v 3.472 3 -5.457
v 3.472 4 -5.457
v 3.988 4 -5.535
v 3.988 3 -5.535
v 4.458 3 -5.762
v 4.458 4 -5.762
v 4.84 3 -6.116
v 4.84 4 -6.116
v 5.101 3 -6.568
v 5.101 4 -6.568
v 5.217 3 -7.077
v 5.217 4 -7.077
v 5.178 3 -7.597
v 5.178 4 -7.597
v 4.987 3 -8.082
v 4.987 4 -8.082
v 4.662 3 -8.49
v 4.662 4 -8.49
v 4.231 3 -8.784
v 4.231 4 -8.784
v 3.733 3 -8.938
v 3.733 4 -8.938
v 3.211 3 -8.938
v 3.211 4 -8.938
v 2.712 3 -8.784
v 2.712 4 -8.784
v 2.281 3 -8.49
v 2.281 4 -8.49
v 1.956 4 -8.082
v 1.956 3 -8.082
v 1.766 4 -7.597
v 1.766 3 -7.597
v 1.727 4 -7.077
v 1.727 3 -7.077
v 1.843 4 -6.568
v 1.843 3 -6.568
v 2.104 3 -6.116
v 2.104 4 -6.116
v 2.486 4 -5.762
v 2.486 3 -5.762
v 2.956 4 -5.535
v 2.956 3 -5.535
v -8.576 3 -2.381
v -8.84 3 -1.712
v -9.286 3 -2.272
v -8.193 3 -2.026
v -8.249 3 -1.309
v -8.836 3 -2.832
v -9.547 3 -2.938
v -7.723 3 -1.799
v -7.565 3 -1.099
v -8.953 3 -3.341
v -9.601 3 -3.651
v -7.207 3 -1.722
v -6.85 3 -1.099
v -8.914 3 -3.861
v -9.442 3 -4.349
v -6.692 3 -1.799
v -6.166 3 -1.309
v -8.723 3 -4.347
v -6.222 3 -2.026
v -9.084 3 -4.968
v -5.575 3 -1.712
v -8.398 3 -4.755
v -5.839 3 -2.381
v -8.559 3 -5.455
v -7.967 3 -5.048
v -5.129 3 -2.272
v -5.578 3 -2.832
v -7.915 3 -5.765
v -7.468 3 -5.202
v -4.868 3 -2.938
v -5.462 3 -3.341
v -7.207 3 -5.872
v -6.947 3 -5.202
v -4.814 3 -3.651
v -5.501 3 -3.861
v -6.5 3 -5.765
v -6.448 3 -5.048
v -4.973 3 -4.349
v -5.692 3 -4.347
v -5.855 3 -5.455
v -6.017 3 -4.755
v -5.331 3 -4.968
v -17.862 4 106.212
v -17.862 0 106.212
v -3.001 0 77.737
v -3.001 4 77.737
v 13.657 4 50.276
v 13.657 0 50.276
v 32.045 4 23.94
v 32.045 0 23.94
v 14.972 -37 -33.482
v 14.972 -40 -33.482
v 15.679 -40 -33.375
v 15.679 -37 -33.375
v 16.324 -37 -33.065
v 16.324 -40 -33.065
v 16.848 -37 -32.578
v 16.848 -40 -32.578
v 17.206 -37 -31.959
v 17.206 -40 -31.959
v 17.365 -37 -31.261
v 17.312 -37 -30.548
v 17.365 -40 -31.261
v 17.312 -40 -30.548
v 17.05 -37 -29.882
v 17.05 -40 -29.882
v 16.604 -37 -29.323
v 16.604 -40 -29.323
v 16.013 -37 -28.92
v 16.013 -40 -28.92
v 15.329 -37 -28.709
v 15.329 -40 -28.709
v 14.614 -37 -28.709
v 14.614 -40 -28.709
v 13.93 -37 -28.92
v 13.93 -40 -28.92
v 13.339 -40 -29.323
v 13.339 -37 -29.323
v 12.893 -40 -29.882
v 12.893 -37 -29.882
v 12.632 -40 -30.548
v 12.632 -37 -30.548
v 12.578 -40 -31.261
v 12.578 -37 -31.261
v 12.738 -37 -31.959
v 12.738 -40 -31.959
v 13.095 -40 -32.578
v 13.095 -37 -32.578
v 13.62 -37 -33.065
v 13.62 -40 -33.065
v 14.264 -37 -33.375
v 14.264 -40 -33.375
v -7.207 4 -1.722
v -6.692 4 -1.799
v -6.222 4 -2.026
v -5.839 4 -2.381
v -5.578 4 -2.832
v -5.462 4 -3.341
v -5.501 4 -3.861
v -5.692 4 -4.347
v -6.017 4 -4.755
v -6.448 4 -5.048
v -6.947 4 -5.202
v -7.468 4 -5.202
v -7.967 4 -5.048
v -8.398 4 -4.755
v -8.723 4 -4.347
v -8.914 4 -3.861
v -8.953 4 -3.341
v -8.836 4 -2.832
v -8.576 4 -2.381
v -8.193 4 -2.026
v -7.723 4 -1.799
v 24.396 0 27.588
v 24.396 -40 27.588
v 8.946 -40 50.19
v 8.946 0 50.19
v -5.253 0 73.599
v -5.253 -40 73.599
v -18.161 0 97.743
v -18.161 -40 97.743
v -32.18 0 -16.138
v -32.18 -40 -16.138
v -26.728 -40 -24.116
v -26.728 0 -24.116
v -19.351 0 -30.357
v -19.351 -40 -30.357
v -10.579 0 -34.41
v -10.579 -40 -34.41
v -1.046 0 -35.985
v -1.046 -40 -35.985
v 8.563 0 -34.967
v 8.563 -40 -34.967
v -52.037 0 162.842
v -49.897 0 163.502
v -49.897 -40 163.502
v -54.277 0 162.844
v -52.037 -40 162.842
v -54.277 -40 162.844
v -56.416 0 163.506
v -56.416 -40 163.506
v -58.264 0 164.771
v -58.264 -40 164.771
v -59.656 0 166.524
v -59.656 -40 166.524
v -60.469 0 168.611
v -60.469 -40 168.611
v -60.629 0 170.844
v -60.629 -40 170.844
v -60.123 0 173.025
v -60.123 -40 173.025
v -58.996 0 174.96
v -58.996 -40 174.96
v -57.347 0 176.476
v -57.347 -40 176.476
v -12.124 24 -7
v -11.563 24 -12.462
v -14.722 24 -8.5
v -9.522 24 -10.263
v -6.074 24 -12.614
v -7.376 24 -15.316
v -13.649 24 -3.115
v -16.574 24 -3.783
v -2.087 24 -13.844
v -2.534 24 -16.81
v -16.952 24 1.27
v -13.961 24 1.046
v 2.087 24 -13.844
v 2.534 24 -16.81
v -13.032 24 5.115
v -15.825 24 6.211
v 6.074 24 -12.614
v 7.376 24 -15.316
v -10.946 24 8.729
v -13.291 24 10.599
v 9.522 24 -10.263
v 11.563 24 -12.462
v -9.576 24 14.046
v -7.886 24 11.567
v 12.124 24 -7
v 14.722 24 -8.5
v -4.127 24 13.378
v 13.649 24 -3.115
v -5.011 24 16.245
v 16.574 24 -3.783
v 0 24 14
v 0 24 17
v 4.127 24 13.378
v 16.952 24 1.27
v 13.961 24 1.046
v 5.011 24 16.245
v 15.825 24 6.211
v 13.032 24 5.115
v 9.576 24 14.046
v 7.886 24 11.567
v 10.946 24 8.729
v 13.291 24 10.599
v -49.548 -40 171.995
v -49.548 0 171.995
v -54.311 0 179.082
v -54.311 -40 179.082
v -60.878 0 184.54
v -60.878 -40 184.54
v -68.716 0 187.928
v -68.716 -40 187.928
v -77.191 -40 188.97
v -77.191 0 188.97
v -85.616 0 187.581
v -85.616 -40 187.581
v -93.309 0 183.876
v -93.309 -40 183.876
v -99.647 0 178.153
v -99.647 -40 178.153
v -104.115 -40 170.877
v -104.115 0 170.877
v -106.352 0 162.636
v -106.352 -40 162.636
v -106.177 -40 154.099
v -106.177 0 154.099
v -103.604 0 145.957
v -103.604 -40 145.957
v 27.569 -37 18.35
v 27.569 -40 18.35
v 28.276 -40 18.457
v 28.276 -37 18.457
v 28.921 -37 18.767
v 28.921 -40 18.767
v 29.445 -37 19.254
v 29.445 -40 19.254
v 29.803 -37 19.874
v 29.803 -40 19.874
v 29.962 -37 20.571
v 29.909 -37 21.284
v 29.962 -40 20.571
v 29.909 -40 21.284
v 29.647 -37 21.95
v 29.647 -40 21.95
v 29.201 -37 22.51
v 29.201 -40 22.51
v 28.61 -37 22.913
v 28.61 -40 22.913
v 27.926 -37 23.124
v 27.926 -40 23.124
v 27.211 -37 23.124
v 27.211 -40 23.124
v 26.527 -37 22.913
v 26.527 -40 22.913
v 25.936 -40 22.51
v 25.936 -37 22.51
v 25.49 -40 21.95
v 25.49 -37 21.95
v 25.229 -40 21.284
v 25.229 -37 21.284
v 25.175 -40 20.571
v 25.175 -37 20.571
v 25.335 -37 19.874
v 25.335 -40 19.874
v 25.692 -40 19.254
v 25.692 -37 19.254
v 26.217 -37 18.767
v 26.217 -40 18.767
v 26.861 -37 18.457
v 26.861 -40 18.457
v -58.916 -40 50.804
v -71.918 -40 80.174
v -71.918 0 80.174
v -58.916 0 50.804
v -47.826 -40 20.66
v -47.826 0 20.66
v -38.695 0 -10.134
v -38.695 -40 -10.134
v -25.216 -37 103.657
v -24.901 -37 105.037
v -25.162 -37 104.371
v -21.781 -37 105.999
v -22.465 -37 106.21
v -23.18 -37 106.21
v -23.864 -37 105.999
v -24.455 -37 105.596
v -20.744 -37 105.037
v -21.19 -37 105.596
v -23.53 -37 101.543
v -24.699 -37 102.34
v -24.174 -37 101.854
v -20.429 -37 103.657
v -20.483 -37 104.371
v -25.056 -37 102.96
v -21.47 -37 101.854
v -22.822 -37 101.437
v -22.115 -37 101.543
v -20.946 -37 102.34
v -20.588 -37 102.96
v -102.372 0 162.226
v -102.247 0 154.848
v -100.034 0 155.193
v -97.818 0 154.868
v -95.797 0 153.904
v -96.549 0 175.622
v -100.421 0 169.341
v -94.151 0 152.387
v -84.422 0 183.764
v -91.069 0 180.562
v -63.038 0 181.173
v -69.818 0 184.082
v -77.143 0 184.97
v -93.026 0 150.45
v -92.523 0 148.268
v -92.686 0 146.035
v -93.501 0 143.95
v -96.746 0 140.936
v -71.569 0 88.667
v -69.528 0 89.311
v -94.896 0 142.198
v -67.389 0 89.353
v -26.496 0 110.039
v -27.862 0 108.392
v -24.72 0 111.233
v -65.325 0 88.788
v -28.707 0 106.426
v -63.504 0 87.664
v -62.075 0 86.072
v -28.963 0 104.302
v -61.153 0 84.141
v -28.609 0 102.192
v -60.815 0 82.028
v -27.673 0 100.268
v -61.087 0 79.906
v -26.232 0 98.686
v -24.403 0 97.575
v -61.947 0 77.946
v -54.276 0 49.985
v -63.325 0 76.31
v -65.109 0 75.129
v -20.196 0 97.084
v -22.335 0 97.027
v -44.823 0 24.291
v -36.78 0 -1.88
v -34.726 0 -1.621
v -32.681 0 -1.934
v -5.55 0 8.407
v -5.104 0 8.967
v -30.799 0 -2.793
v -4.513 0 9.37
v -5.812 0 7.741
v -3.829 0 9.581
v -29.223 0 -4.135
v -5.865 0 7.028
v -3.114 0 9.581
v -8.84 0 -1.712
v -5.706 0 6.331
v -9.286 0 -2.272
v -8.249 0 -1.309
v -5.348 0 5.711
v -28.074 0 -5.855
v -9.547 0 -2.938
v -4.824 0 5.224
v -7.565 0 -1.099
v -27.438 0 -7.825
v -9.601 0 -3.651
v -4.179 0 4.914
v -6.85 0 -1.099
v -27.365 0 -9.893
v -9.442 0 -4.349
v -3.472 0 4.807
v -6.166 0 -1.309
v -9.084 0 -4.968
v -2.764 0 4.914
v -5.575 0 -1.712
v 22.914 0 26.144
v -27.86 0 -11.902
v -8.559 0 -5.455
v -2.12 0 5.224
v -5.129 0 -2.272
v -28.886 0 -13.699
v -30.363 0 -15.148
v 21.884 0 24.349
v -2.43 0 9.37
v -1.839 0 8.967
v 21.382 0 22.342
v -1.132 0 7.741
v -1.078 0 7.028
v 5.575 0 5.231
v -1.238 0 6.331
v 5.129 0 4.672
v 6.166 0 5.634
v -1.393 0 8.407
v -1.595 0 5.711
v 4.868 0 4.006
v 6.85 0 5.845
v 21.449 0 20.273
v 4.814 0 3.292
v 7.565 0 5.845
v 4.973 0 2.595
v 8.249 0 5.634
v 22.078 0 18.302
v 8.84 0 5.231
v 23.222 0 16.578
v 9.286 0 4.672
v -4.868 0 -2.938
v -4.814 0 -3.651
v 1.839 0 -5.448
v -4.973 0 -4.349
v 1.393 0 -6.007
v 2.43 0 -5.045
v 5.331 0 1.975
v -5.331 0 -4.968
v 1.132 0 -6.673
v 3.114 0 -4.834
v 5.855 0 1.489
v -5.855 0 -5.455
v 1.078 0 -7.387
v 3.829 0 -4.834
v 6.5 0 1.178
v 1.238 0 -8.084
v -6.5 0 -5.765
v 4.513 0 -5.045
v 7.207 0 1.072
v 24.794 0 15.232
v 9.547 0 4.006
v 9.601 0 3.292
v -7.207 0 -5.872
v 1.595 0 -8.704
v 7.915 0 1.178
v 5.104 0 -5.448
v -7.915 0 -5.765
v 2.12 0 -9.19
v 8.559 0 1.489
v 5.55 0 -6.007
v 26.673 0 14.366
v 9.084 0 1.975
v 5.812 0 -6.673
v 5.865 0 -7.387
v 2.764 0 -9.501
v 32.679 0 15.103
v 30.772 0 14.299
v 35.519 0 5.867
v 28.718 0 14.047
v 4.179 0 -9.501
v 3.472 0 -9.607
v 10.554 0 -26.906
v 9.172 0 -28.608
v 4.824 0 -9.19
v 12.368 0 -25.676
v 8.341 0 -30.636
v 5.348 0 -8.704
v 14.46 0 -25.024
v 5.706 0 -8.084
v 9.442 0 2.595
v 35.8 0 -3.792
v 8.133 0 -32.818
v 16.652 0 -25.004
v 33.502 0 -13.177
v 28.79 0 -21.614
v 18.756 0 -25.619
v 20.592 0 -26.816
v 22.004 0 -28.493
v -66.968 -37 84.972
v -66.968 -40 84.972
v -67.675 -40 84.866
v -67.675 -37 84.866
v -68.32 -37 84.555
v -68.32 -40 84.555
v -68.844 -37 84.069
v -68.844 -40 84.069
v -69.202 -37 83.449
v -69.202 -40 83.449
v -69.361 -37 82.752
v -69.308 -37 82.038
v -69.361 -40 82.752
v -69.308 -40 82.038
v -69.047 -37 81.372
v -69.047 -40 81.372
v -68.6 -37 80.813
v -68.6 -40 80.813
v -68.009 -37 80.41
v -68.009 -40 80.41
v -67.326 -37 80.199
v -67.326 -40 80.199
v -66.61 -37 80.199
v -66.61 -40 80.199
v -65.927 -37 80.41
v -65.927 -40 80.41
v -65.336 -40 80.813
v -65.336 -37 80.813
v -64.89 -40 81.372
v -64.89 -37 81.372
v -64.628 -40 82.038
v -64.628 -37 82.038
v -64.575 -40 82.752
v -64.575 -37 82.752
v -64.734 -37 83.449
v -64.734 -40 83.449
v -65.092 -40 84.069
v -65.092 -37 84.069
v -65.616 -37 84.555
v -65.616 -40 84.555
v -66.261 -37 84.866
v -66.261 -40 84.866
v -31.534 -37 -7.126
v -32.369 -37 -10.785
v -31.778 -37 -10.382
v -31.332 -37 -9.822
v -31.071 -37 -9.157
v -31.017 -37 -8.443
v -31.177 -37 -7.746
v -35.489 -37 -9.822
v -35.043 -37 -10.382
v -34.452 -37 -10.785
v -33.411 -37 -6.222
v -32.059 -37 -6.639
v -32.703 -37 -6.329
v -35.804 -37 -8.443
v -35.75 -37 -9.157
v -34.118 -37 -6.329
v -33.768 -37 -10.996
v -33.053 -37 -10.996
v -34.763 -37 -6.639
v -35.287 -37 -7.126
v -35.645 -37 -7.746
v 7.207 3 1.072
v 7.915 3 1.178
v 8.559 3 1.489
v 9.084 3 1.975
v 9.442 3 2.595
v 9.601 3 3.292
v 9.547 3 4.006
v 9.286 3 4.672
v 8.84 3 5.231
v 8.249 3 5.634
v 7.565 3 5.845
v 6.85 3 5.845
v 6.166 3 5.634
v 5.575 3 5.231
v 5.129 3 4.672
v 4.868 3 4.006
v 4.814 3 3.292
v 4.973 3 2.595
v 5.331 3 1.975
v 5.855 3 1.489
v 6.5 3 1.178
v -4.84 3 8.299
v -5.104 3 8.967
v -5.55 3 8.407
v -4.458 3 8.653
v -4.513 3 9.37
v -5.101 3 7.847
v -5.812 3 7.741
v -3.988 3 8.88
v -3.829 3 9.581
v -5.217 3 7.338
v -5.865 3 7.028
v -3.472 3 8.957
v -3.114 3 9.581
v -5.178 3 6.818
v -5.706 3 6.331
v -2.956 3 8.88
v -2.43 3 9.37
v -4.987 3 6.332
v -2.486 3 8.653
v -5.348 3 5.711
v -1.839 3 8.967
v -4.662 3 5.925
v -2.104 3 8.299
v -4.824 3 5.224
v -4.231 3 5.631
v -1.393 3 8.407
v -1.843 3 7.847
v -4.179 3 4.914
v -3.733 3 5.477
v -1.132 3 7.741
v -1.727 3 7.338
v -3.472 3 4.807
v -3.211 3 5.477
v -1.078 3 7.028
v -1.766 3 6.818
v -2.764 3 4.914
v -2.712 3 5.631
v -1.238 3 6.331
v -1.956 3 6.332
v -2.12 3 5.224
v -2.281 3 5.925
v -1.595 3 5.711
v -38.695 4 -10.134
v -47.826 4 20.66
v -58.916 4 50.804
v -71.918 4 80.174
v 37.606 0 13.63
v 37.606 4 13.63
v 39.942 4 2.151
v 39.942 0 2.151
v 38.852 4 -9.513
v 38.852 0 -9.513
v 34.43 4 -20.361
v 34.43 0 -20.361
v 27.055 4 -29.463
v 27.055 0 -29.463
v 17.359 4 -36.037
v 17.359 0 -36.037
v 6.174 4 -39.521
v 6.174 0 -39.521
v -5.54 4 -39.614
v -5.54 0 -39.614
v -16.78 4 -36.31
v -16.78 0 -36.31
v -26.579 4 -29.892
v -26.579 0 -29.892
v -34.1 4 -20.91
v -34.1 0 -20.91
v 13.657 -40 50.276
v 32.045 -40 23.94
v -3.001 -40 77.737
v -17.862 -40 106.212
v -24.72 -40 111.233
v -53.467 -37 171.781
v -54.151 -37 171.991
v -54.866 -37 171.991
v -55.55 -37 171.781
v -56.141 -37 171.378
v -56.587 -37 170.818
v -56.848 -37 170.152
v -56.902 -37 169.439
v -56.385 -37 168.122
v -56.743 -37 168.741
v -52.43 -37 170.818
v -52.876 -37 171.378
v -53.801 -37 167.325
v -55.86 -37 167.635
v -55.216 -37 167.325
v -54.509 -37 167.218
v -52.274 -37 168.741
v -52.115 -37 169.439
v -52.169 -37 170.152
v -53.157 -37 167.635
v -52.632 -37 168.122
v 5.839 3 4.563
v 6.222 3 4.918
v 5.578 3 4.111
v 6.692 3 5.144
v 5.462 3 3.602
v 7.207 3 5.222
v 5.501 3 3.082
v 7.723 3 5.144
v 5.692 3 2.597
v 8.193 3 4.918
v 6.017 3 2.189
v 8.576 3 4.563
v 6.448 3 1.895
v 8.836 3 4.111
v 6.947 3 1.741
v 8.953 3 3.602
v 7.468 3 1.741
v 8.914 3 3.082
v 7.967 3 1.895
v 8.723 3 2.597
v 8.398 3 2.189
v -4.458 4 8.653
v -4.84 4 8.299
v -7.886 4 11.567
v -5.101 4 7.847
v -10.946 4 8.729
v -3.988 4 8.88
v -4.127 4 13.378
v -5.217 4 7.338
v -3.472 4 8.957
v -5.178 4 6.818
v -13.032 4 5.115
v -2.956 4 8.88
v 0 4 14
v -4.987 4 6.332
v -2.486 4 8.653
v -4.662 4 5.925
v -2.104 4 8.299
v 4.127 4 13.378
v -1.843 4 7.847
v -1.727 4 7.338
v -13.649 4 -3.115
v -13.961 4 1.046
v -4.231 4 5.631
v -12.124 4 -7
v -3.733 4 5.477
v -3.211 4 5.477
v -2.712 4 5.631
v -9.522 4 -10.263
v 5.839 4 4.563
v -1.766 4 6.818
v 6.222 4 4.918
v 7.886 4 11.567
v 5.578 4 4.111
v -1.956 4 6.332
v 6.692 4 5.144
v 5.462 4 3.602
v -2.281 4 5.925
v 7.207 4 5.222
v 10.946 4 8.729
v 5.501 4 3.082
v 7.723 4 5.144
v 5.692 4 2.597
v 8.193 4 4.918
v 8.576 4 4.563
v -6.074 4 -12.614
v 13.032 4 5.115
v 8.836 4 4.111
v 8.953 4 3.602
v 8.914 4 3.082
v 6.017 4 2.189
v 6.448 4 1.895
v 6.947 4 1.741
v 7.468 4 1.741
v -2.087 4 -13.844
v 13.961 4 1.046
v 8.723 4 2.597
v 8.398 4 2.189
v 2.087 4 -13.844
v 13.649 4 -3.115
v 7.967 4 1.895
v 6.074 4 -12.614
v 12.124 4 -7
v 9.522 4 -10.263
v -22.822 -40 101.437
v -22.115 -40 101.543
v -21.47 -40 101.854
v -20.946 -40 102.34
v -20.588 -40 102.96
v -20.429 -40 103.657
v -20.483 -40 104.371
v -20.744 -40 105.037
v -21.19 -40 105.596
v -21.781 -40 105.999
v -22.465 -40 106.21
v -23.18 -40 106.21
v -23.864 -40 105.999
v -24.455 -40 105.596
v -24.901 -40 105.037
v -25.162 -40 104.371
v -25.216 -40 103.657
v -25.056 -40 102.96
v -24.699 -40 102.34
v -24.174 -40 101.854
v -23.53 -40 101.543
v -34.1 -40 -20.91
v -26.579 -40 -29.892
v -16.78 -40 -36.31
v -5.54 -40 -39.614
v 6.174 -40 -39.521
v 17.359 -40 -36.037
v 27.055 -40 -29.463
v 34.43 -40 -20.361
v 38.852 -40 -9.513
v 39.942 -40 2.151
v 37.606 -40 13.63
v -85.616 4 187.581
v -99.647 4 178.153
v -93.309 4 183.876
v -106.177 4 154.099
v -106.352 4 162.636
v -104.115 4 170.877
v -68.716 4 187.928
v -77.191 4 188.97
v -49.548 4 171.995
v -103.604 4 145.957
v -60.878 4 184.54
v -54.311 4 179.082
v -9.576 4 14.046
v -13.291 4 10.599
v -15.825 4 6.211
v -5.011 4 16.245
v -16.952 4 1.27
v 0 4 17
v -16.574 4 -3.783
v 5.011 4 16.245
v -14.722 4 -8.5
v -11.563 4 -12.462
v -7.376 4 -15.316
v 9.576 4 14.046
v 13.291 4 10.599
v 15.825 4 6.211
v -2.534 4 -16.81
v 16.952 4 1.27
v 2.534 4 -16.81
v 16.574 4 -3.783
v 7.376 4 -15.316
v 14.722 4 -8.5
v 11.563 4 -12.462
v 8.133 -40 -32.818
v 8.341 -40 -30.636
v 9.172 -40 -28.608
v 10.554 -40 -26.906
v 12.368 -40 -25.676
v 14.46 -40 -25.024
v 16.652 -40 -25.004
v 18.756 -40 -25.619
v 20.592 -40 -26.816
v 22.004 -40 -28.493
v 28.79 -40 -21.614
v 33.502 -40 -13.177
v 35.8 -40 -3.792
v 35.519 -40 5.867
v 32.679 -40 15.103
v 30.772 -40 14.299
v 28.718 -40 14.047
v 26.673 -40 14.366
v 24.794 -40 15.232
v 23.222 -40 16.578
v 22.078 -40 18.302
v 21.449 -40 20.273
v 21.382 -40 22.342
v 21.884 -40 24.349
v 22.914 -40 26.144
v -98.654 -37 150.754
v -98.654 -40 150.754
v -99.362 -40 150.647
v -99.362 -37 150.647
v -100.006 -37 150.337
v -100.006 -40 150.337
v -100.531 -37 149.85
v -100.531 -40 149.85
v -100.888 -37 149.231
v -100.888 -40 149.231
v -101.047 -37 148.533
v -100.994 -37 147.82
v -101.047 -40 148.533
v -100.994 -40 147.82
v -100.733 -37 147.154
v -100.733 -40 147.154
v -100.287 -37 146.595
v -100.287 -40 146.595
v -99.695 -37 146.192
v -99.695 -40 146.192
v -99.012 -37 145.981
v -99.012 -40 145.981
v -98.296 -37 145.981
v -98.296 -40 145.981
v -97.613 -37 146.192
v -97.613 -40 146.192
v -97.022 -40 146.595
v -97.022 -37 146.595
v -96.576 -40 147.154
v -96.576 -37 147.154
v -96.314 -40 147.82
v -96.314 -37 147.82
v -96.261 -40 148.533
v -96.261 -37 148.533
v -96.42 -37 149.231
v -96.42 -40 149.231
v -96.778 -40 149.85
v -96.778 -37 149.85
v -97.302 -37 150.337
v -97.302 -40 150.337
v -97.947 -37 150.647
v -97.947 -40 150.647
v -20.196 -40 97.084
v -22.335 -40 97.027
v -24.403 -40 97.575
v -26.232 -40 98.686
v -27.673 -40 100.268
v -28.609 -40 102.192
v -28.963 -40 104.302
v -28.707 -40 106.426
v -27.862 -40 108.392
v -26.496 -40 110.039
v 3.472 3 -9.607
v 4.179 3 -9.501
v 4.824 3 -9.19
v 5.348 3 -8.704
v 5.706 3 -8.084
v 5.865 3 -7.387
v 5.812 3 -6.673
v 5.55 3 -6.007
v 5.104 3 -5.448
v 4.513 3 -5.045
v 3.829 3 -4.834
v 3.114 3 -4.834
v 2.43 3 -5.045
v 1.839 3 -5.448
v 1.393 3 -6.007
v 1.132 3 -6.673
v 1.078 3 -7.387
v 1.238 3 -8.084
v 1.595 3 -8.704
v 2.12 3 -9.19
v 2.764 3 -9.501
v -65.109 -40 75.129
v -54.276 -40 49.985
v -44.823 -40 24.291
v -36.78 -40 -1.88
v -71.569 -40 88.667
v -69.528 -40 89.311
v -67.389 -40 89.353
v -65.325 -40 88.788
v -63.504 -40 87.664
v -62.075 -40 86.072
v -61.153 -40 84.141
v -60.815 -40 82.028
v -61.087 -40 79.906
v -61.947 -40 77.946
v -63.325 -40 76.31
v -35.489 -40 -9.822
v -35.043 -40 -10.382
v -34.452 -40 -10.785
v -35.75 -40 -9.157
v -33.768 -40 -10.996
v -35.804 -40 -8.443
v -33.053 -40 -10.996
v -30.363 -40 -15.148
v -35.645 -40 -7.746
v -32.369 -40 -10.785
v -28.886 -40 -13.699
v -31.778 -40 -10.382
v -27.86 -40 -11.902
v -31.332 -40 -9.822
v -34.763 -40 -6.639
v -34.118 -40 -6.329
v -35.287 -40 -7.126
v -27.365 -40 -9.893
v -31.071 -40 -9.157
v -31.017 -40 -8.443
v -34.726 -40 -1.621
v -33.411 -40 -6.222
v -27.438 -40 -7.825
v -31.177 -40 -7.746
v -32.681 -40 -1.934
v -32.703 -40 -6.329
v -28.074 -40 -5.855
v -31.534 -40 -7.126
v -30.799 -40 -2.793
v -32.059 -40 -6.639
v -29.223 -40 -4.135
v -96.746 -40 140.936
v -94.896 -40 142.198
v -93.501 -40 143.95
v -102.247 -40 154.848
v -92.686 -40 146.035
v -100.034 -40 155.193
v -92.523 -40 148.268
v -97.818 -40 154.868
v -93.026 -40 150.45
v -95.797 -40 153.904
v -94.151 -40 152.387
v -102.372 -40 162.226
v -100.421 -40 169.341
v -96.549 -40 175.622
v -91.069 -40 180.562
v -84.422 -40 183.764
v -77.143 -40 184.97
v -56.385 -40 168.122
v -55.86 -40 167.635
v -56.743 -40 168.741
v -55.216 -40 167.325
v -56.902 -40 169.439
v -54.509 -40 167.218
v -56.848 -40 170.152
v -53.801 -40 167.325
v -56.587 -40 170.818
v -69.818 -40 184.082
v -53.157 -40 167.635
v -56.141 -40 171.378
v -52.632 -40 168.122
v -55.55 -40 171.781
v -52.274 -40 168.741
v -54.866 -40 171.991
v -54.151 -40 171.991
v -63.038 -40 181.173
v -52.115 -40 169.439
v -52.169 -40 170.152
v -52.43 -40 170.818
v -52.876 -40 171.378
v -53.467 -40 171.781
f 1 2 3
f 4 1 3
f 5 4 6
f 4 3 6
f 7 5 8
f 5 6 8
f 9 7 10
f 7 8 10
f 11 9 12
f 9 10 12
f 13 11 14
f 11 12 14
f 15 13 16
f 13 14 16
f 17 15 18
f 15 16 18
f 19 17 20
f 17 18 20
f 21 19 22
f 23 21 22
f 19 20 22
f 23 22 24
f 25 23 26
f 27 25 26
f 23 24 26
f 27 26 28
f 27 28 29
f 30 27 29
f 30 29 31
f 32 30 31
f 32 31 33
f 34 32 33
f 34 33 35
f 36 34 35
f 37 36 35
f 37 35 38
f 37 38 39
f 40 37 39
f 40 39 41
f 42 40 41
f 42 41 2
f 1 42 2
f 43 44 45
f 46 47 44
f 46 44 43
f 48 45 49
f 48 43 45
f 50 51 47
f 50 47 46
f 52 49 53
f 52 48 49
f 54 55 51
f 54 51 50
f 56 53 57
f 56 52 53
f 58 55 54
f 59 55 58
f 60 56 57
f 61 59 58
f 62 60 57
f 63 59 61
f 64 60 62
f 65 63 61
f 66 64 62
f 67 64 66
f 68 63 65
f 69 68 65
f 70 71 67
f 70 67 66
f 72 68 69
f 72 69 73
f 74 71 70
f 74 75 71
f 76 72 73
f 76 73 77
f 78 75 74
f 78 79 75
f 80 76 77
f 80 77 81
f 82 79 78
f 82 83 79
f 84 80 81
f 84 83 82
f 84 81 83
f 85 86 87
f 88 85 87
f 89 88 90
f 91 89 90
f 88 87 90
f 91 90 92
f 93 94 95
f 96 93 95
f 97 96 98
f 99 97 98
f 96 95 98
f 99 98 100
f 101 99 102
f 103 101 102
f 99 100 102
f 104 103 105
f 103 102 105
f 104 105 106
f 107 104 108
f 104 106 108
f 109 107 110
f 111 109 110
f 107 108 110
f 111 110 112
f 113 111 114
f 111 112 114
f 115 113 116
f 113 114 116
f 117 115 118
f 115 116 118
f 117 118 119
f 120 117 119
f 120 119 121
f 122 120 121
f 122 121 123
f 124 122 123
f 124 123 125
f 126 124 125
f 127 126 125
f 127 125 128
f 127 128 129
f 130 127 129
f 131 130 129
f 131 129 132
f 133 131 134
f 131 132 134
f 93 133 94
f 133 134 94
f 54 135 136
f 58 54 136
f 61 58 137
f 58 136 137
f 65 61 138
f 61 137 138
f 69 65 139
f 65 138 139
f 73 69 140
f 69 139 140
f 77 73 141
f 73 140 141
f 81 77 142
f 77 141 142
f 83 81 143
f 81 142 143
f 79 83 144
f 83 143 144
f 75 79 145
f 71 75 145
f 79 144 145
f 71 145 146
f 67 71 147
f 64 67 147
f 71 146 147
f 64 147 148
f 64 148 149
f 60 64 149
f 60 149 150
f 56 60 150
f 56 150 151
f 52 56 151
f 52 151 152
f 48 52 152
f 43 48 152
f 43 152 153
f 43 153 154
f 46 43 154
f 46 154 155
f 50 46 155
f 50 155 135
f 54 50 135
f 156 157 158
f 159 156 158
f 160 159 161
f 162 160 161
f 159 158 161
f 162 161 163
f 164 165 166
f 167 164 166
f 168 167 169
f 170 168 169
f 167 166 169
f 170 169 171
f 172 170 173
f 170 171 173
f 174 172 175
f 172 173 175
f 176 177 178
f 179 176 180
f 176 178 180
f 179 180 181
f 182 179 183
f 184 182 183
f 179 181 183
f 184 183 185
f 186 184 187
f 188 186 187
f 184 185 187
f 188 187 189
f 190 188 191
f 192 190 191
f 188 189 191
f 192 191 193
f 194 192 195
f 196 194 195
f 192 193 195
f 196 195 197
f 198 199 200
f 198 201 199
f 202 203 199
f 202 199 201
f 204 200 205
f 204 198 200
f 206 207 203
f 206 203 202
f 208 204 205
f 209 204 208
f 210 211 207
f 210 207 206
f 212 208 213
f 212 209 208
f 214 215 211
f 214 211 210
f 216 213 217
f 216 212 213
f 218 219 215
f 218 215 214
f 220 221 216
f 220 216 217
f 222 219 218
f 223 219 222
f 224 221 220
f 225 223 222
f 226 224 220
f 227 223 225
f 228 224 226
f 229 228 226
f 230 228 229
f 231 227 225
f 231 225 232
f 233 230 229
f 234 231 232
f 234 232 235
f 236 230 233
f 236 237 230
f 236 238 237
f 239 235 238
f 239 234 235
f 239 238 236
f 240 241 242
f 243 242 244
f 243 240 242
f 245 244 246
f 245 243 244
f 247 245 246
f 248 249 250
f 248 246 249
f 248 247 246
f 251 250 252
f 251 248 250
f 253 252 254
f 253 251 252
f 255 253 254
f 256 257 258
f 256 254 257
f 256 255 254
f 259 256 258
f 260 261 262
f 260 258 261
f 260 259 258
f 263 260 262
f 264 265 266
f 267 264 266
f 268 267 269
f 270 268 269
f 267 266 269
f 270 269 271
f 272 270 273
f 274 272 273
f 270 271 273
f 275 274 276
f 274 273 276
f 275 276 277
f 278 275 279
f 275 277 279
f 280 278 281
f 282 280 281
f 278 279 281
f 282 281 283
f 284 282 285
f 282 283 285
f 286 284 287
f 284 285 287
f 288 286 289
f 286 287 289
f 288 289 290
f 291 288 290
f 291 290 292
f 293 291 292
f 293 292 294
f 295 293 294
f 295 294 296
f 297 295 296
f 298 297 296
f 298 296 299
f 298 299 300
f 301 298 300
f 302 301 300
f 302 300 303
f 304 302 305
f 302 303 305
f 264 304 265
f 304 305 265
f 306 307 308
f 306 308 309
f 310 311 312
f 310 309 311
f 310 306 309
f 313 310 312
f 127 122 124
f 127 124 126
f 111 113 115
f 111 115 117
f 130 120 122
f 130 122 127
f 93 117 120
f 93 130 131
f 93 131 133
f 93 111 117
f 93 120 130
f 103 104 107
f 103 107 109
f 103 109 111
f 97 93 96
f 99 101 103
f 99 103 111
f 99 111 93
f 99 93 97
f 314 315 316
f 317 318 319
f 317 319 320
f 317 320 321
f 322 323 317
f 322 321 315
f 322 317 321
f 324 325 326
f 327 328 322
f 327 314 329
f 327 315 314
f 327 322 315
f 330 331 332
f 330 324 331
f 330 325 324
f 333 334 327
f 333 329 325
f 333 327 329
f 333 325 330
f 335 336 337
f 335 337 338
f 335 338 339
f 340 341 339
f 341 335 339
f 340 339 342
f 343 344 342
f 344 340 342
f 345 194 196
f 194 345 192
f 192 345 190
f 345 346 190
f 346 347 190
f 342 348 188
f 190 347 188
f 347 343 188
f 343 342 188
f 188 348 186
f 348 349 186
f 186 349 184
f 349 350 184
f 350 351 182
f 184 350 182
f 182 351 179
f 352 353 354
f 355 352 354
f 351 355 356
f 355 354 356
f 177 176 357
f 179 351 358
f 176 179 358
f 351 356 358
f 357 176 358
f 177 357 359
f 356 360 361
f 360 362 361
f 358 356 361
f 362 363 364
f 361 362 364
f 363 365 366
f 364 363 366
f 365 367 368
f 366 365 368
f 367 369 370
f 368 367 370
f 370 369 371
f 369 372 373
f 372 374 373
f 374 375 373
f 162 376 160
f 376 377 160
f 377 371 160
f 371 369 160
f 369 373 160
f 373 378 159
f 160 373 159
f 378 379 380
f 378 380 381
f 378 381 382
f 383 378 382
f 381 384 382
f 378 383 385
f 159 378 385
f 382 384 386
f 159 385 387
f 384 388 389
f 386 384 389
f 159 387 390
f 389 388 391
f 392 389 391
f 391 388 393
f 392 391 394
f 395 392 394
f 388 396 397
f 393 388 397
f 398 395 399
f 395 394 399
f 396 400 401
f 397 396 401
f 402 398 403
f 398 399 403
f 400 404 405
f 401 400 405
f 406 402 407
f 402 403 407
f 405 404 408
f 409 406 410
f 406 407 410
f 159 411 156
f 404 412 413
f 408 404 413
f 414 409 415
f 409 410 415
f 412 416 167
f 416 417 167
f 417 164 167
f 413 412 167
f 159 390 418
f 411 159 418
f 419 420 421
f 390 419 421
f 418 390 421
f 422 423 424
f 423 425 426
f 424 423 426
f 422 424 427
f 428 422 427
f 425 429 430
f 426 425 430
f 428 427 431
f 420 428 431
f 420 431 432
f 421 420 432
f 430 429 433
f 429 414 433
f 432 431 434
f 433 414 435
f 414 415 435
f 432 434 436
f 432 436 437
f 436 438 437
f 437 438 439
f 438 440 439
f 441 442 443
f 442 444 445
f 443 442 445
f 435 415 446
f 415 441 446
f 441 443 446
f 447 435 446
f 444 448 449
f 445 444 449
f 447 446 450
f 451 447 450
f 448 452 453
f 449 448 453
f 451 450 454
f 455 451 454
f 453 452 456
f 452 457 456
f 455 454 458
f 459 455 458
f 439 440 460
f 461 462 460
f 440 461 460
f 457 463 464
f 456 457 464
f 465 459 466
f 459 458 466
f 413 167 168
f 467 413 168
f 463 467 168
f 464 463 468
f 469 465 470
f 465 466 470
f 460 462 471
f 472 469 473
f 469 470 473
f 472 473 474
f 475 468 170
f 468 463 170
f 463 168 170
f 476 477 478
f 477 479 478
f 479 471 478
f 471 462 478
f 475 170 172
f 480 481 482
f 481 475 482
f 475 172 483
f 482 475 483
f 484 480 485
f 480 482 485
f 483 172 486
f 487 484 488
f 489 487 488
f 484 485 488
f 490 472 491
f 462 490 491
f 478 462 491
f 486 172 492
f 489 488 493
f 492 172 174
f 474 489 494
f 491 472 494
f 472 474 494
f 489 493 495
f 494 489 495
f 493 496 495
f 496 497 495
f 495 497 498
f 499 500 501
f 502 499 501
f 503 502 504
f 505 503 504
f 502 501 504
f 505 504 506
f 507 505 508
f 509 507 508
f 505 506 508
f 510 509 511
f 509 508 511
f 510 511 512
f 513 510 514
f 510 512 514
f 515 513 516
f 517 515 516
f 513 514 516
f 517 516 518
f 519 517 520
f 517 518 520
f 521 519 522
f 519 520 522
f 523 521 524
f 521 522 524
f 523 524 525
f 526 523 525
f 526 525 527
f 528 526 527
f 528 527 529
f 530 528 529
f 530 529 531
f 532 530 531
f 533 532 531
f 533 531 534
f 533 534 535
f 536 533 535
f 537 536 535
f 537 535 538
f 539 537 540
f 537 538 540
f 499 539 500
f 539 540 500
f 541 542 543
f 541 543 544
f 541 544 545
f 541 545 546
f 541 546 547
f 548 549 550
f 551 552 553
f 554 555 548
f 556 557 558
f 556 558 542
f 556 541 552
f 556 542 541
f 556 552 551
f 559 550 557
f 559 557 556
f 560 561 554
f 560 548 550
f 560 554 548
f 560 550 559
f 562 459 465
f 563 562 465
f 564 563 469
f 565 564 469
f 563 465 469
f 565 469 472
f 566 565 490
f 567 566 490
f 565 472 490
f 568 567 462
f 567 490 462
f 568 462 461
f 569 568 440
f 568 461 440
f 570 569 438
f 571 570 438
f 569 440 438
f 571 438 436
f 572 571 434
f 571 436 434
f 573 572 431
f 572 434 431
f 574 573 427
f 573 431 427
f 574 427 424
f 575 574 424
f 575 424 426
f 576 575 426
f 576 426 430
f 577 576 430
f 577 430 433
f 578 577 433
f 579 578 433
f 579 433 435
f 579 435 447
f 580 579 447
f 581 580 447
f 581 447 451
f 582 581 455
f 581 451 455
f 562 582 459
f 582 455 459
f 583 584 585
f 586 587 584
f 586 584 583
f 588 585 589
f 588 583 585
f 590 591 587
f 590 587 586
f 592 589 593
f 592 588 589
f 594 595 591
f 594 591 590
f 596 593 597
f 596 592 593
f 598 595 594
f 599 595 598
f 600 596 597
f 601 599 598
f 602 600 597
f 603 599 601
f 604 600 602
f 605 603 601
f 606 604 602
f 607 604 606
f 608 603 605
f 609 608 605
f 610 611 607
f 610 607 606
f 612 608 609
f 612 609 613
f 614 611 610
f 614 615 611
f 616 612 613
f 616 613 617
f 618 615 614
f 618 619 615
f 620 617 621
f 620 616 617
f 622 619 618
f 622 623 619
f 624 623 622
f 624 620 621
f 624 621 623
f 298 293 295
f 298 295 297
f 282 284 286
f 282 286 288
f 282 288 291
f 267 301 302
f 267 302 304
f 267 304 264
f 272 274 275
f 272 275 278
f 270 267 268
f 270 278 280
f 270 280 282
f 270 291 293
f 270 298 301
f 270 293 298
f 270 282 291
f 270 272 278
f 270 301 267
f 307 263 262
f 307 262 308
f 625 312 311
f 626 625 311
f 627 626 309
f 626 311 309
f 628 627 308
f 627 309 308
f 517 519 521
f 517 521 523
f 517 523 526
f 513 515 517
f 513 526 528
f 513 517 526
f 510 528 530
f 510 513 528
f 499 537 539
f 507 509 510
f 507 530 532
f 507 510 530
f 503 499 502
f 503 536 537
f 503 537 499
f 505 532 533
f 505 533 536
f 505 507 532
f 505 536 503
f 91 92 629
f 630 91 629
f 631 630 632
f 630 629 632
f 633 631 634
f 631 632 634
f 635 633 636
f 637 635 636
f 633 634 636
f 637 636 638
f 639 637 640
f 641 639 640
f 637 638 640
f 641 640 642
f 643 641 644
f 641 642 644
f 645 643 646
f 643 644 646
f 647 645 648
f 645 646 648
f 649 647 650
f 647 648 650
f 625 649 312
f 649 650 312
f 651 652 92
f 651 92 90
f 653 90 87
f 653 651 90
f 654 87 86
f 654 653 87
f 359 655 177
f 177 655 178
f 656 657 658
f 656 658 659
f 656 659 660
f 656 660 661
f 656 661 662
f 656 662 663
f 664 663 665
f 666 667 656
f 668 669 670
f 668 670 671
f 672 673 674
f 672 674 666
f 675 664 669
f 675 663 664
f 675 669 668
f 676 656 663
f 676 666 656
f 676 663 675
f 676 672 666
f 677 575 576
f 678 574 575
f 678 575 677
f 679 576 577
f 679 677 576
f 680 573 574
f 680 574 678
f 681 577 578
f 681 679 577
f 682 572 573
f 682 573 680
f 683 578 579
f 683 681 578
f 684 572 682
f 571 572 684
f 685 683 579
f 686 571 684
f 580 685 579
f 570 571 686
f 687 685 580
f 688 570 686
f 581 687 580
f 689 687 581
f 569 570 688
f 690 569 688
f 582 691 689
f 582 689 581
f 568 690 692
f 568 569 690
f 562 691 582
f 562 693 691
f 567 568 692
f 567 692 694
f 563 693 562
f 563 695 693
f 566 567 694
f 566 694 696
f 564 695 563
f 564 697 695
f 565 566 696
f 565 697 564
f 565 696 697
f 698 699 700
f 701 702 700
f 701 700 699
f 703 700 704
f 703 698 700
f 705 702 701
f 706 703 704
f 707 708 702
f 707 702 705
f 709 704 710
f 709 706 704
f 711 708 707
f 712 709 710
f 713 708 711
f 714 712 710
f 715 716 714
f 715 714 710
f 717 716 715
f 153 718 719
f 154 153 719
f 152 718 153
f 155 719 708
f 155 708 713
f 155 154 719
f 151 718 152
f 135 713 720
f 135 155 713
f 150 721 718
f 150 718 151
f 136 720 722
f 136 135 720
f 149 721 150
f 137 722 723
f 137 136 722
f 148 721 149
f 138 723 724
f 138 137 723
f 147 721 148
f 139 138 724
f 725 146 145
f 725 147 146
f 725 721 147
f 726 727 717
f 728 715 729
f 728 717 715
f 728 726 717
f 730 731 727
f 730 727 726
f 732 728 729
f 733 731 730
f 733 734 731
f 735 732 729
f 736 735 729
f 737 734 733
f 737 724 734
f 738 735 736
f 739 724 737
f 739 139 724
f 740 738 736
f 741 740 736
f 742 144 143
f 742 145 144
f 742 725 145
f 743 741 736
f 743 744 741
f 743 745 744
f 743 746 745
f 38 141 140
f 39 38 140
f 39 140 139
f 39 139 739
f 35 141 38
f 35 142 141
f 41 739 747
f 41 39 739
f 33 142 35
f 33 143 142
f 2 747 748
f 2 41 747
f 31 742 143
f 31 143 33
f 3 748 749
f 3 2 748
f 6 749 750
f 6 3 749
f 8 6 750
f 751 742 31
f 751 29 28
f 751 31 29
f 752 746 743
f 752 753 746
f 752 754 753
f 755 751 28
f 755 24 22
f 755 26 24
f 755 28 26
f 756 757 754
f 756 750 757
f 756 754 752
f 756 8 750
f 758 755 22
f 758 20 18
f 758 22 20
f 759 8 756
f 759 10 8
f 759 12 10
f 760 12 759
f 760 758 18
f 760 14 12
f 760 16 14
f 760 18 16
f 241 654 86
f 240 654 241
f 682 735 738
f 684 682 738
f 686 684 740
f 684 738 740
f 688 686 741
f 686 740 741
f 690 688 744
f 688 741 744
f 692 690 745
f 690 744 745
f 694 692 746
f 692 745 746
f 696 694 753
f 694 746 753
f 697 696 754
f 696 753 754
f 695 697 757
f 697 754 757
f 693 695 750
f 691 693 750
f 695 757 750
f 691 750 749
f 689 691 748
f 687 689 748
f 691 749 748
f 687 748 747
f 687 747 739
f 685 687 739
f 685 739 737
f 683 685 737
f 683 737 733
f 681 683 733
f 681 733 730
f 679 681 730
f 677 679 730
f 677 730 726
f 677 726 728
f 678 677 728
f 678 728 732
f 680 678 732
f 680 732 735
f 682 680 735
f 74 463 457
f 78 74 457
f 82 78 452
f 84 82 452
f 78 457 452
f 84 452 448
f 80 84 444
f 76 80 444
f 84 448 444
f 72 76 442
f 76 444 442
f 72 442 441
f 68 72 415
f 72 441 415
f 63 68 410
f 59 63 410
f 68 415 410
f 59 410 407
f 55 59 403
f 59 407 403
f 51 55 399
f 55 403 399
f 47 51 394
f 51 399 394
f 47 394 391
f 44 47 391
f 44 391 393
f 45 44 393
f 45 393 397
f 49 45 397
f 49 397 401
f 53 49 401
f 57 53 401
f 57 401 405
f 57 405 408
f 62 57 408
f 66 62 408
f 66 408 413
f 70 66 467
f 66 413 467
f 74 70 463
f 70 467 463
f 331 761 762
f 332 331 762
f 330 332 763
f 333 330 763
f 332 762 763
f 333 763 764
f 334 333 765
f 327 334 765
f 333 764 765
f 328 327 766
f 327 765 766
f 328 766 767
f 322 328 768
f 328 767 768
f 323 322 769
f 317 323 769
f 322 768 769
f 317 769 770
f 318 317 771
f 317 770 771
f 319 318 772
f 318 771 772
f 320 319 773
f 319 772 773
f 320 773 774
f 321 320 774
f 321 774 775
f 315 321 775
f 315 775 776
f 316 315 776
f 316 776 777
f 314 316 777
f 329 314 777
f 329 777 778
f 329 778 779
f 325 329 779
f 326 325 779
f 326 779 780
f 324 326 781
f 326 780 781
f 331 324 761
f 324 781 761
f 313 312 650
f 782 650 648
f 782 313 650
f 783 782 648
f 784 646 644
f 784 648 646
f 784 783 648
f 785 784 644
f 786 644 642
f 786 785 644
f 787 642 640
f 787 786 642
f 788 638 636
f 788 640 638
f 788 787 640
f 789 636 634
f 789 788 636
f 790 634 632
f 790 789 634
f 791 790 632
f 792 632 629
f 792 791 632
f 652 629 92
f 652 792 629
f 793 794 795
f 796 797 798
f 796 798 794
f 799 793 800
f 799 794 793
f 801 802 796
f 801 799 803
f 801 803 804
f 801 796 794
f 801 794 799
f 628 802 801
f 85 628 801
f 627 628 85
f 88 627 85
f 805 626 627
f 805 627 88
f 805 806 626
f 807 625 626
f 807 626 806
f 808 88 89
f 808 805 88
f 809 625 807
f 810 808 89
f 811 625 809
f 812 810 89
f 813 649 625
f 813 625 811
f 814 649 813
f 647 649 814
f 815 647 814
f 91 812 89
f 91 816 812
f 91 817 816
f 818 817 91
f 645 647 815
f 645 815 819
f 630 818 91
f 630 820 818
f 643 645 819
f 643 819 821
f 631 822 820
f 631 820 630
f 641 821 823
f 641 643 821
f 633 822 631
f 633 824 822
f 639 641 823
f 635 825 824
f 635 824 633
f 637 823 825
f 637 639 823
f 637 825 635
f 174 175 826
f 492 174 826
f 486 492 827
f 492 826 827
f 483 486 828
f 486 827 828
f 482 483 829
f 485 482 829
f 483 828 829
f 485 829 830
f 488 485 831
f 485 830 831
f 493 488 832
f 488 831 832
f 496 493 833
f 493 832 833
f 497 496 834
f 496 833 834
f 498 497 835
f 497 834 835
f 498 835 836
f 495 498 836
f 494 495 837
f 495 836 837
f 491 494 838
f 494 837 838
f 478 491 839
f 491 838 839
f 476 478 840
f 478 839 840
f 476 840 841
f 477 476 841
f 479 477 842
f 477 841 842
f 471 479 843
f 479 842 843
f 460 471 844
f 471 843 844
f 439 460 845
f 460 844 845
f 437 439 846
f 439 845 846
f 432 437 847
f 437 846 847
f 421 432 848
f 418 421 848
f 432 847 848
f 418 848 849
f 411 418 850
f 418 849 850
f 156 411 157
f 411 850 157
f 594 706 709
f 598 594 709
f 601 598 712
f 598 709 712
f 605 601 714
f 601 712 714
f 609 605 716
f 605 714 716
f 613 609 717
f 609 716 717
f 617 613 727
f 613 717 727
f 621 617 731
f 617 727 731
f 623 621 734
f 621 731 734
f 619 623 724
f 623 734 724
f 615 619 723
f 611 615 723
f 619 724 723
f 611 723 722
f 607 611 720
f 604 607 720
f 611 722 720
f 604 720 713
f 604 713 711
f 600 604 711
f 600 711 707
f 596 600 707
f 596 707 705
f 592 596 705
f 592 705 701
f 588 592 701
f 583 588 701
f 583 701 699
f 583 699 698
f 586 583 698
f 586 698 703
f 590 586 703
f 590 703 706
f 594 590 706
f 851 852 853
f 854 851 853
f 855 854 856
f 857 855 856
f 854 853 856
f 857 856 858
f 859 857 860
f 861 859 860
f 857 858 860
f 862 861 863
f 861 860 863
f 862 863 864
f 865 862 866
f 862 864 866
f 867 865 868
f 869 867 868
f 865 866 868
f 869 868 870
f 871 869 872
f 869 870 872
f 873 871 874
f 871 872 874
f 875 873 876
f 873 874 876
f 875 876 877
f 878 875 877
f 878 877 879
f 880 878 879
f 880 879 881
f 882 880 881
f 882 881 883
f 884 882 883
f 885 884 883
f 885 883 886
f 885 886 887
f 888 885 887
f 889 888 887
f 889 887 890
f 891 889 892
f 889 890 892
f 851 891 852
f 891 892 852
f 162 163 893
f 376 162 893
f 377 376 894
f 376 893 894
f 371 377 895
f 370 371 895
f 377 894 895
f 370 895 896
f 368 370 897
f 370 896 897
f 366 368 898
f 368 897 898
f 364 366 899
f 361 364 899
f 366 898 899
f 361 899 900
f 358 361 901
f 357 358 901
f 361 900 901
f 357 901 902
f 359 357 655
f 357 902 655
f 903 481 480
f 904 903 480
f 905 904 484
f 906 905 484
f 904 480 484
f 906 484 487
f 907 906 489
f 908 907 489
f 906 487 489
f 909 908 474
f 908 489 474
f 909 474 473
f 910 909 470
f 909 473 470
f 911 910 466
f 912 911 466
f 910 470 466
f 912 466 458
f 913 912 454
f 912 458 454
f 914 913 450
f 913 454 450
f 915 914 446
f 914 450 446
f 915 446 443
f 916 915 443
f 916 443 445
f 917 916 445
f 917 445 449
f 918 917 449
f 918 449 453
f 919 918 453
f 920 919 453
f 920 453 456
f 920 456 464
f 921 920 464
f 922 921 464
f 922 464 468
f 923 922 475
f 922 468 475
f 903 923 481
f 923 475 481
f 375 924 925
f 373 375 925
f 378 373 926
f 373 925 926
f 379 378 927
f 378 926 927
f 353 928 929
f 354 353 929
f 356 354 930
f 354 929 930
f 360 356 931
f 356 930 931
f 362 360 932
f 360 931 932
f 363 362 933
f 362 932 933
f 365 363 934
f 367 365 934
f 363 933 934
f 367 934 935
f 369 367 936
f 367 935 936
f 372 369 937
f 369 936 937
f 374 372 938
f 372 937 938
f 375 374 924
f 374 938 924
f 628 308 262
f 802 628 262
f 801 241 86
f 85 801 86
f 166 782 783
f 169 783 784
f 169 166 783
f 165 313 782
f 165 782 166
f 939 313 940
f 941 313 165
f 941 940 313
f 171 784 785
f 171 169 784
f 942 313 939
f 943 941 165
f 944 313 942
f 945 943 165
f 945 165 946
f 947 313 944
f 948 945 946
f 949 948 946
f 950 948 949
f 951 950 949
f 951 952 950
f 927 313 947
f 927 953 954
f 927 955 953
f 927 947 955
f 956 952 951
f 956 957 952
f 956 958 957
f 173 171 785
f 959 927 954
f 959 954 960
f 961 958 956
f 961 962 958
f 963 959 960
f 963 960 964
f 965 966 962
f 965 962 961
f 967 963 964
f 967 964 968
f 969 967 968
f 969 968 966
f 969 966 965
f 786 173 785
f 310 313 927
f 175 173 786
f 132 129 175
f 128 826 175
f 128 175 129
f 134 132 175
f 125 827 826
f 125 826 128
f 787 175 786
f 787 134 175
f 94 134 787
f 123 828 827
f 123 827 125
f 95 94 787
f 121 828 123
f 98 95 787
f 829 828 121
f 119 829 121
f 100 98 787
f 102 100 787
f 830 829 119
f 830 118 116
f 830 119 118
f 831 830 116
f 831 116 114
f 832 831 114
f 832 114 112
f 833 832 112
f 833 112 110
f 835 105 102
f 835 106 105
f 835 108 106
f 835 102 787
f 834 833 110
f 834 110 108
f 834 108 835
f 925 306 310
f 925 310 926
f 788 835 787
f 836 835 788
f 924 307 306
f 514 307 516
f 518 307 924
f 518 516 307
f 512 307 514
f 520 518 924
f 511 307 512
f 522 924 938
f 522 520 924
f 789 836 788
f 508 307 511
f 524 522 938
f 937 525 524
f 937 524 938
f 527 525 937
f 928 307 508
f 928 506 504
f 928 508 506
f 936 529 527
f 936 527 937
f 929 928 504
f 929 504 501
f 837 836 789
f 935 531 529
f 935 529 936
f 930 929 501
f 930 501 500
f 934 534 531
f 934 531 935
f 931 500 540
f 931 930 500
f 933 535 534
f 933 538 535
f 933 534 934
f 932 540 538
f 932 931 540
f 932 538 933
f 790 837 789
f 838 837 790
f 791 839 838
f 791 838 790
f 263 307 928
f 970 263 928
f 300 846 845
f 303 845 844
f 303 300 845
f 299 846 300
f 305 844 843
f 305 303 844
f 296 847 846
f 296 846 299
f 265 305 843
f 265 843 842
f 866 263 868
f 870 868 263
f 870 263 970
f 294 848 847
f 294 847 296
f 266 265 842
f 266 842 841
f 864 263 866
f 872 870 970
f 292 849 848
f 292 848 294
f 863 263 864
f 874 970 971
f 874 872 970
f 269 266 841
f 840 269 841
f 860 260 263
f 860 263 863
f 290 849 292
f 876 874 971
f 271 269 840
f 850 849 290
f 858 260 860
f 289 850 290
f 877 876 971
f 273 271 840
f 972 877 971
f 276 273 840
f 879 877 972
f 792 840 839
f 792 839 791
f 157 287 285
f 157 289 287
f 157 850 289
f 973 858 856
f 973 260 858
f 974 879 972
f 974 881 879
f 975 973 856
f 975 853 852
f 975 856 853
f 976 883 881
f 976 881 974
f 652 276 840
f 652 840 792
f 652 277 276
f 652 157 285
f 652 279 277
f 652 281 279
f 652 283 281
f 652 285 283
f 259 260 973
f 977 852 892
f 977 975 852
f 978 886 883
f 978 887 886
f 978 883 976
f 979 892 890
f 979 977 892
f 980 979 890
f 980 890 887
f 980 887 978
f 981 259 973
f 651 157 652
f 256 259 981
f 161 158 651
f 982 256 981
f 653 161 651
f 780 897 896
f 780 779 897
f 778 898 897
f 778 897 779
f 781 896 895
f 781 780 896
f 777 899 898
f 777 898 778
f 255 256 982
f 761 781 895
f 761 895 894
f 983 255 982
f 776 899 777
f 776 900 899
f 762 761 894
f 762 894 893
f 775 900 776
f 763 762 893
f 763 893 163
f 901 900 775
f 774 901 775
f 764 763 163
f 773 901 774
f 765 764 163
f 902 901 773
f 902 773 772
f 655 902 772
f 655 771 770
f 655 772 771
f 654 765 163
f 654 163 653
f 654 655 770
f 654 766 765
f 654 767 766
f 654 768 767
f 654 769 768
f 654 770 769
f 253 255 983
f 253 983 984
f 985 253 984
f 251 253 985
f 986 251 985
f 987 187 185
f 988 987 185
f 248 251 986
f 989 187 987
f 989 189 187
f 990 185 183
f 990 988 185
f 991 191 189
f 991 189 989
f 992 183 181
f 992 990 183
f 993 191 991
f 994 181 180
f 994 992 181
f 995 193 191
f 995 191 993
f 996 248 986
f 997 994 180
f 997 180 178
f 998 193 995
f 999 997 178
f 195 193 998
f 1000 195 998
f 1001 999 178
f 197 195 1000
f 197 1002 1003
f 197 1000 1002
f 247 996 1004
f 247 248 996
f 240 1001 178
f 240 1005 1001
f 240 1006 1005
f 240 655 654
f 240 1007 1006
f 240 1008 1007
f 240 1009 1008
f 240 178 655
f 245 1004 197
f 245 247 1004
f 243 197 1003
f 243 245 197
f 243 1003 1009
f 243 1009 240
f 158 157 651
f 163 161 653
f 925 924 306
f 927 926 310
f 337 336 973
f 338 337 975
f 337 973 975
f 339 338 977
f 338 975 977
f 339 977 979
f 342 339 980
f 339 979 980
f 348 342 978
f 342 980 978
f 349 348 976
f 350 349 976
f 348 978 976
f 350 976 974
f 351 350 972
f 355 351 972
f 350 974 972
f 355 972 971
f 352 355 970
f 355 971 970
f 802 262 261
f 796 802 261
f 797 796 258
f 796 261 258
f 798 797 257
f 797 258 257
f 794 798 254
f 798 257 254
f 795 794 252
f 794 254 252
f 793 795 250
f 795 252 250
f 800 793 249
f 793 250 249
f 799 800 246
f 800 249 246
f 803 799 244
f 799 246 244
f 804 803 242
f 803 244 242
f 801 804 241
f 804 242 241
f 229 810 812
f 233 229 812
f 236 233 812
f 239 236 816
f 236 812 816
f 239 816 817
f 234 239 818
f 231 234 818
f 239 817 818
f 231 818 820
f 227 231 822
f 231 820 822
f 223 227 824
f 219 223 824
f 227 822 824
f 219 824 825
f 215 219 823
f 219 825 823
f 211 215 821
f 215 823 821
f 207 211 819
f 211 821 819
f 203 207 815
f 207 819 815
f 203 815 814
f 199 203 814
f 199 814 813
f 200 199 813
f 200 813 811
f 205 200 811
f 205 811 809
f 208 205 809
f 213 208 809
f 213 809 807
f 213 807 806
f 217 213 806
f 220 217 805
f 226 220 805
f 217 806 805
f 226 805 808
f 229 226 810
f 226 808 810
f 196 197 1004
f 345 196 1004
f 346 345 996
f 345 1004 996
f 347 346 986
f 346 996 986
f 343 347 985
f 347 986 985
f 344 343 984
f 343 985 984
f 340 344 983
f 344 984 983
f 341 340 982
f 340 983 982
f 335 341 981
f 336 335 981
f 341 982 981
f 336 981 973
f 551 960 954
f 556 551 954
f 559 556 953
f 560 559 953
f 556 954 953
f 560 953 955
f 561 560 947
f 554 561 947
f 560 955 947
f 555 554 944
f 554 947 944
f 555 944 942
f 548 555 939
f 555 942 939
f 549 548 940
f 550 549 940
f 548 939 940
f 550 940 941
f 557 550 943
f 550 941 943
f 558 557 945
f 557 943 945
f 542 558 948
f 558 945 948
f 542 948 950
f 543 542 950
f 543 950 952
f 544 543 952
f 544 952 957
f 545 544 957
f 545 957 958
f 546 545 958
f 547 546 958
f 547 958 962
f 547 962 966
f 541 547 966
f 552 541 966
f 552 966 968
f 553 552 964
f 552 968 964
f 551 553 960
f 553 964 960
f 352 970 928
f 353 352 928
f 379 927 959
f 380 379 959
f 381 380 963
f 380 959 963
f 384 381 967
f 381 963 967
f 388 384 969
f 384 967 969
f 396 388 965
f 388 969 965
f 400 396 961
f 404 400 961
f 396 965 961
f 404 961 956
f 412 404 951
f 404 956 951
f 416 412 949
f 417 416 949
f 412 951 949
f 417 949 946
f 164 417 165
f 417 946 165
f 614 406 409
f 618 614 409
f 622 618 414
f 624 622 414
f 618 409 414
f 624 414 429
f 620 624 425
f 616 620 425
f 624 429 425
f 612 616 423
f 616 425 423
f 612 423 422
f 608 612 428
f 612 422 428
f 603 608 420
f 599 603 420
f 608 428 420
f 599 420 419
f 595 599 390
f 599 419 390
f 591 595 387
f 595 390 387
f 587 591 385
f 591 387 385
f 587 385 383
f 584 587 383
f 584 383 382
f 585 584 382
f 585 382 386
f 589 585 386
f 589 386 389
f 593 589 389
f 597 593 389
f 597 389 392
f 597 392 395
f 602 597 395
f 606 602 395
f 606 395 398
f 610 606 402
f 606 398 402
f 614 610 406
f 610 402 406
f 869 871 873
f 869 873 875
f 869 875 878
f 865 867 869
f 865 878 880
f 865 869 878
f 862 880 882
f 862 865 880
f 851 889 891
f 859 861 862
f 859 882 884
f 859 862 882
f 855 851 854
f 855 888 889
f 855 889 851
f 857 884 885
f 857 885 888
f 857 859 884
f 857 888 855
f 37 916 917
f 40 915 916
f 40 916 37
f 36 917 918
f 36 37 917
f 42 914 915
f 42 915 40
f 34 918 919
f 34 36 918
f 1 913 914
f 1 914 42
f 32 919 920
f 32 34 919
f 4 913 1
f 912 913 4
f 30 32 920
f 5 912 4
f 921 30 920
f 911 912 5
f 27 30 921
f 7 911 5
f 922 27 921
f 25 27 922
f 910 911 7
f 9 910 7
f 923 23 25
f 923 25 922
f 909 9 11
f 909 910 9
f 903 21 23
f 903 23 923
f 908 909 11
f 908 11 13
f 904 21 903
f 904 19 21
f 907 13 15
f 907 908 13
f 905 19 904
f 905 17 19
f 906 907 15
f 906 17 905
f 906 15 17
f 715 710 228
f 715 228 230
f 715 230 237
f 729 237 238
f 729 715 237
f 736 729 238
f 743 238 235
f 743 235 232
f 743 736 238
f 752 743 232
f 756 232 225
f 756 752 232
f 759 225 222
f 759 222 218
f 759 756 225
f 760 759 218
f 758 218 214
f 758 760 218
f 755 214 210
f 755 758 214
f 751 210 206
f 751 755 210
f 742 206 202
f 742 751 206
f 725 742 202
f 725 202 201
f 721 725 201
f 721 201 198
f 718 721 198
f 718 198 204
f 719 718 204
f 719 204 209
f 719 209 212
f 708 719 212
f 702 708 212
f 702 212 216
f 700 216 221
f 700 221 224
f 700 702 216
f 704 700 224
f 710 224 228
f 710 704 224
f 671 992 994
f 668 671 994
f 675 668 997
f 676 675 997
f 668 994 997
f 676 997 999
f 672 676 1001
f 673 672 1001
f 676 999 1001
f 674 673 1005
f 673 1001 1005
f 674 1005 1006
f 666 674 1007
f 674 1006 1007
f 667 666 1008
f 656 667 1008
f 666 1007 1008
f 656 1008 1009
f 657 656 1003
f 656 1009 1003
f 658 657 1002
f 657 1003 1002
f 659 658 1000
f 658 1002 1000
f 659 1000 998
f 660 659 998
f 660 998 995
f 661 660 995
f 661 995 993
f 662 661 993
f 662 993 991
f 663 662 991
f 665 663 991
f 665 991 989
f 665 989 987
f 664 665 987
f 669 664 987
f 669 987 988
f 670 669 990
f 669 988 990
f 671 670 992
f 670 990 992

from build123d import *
from build123d.topology import SkipClean

# Parameters (mm, degrees)
EXTRUDE_1_DEPTH     = 4
SKETCH_4_R          = 17
SKETCH_4_R_2        = 14
EXTRUDE_2_DEPTH     = 20
SKETCH_5_R          = 1.75
CUT_EXTRUDE_1_DEPTH = 20
SKETCH_6_R          = 2.4
CUT_EXTRUDE_2_DEPTH = 3
EXTRUDE_START       = 40
EXTRUDE_5_DEPTH     = 40
SKETCH_12_R         = 2.4
CUT_EXTRUDE_3_DEPTH = 3


with BuildPart() as part:
    # 草图1 → 凸台-拉伸1 (new body)
    with BuildSketch(Plane(origin=(0, 0, 0), x_dir=(1, 0, 0), z_dir=(0, 1, 0))):
        with BuildLine():
            Line((-71.917570517, -80.173954941), (-103.604258307, -145.956882654))
            ThreePointArc((-103.604258307, -145.956882654), (-89.595311386, -186.003722806), (-49.548471234, -171.994775885))
            Line((-49.548471234, -171.994775885), (-17.861783444, -106.211848172))
            ThreePointArc((-17.861783444, -106.211848172), (5.107697531, -63.872728225), (32.044674728, -23.940317909))
            ThreePointArc((32.044674728, -23.940317909), (17.358595487, 36.037191382), (-38.694997244, 10.133962122))
            ThreePointArc((-38.694997244, 10.133962122), (-53.128760753, -35.82106595), (-71.917570517, -80.173954941))
        make_face()
    extrude(amount=EXTRUDE_1_DEPTH)

    # 草图4 → 凸台-拉伸2 (add)
    with BuildSketch(Plane(origin=(0, 4, 0), x_dir=(1, 0, 0), z_dir=(0, 1, 0))):
        with Locations(Location((0, 0, 0), (0, 0, 270))):
            Circle(SKETCH_4_R)
        with Locations(Location((0, 0, 0), (0, 0, 270))):
            Circle(SKETCH_4_R_2, mode=Mode.SUBTRACT)
    extrude(amount=EXTRUDE_2_DEPTH)

    # 草图5 → 切除-拉伸1 (cut)
    with BuildSketch(Plane(origin=(0, 4, 0), x_dir=(1, 0, 0), z_dir=(0, 1, 0))):
        with Locations(Location((3.471719097, 7.207438276, 0), (0, 0, 270))):
            Circle(SKETCH_5_R)
        with Locations(Location((7.207438276, -3.471719097, 0), (0, 0, 270))):
            Circle(SKETCH_5_R)
        with Locations(Location((-3.471719097, -7.207438276, 0), (0, 0, 270))):
            Circle(SKETCH_5_R)
        with Locations(Location((-7.207438276, 3.471719097, 0), (0, 0, 270))):
            Circle(SKETCH_5_R)
    extrude(amount=-CUT_EXTRUDE_1_DEPTH, mode=Mode.SUBTRACT)

    # 草图6 → 切除-拉伸2 (cut)
    with BuildSketch(Plane.XZ):
        with Locations(Location((-3.471719097, 7.207438276, 0), (0, 0, 270))):
            Circle(SKETCH_6_R)
        with Locations(Location((7.207438276, 3.471719097, 0), (0, 0, 270))):
            Circle(SKETCH_6_R)
        with Locations(Location((3.471719097, -7.207438276, 0), (0, 0, 270))):
            Circle(SKETCH_6_R)
        with Locations(Location((-7.207438276, -3.471719097, 0), (0, 0, 270))):
            Circle(SKETCH_6_R)
    extrude(amount=-CUT_EXTRUDE_2_DEPTH, mode=Mode.SUBTRACT)

    # 草图11 → 凸台-拉伸5 (add)
    with SkipClean():  # the faces are left unmerged after this step: merging them gives an invalid solid
        with BuildSketch(Plane.XZ.offset(EXTRUDE_START)):
            with BuildLine():
                Line((-103.604258307, 145.956882654), (-71.917570517, 80.173954941))
                ThreePointArc((-71.917570517, 80.173954941), (-53.128760753, 35.82106595), (-38.694997244, -10.133962122))
                ThreePointArc((-38.694997244, -10.133962122), (17.358595487, -36.037191382), (32.044674728, 23.940317909))
                ThreePointArc((32.044674728, 23.940317909), (5.107697531, 63.872728225), (-17.861783444, 106.211848172))
                Line((-17.861783444, 106.211848172), (-49.548471234, 171.994775885))
                ThreePointArc((-49.548471234, 171.994775885), (-89.595311386, 186.003722806), (-103.604258307, 145.956882654))
            make_face()
            with BuildLine():
                Line((-96.745802514, 140.935768818), (-71.568588033, 88.666787874))
                ThreePointArc((-71.568588033, 88.666787874), (-61.544816275, 85.139390897), (-65.109479918, 75.128811353))
                ThreePointArc((-65.109479918, 75.128811353), (-49.374731136, 37.202102387), (-36.779545797, -1.879592541))
                ThreePointArc((-36.779545797, -1.879592541), (-27.687675592, -6.818067672), (-32.179954873, -16.138478998))
                ThreePointArc((-32.179954873, -16.138478998), (-15.10163612, -32.679360252), (8.5634864, -34.966651265))
                ThreePointArc((8.5634864, -34.966651265), (12.367999285, -25.67649886), (22.003915341, -28.492590434))
                ThreePointArc((22.003915341, -28.492590434), (34.967011705, -8.562014508), (32.678724536, 15.10301171))
                ThreePointArc((32.678724536, 15.10301171), (22.590429241, 17.400170493), (24.396227083, 27.587895194))
                ThreePointArc((24.396227083, 27.587895194), (1.68773424, 61.798155716), (-18.160580922, 97.743419068))
                ThreePointArc((-18.160580922, 97.743419068), (-28.210320728, 101.196136769), (-24.720239236, 111.232962008))
                Line((-24.720239236, 111.232962008), (-49.897453718, 163.501942952))
                ThreePointArc((-49.897453718, 163.501942952), (-59.65614547, 166.524138152), (-57.347459227, 176.475806172))
                ThreePointArc((-57.347459227, 176.475806172), (-87.859451837, 182.400003667), (-102.246681086, 154.848498381))
                ThreePointArc((-102.246681086, 154.848498381), (-93.025918977, 150.450399395), (-96.745802514, 140.935768818))
            make_face(mode=Mode.SUBTRACT)
        extrude(amount=-EXTRUDE_5_DEPTH)

    # 草图12 → 切除-拉伸3 (cut)
    with SkipClean():  # the faces are left unmerged after this step: merging them gives an invalid solid
        with BuildSketch(Plane.XZ.offset(40)):
            with Locations(Location((27.568748152, 20.750426991, 0), (0, 0, 270))):
                Circle(SKETCH_12_R)
            with Locations(Location((-22.822392762, 103.836575579, 0), (0, 0, 270))):
                Circle(SKETCH_12_R)
            with Locations(Location((-54.508506622, 169.61828678, 0), (0, 0, 270))):
                Circle(SKETCH_12_R)
            with Locations(Location((14.971788608, -31.082077567, 0), (0, 0, 270))):
                Circle(SKETCH_12_R)
            with Locations(Location((-98.654144553, 148.353969501, 0), (0, 0, 90))):
                Circle(SKETCH_12_R)
            with Locations(Location((-66.96805025, 82.57224888, 0), (0, 0, 90))):
                Circle(SKETCH_12_R)
            with Locations(Location((-33.410617721, -8.62245432, 0), (0, 0, 90))):
                Circle(SKETCH_12_R)
        extrude(amount=-CUT_EXTRUDE_3_DEPTH, mode=Mode.SUBTRACT)


solid = part.part
